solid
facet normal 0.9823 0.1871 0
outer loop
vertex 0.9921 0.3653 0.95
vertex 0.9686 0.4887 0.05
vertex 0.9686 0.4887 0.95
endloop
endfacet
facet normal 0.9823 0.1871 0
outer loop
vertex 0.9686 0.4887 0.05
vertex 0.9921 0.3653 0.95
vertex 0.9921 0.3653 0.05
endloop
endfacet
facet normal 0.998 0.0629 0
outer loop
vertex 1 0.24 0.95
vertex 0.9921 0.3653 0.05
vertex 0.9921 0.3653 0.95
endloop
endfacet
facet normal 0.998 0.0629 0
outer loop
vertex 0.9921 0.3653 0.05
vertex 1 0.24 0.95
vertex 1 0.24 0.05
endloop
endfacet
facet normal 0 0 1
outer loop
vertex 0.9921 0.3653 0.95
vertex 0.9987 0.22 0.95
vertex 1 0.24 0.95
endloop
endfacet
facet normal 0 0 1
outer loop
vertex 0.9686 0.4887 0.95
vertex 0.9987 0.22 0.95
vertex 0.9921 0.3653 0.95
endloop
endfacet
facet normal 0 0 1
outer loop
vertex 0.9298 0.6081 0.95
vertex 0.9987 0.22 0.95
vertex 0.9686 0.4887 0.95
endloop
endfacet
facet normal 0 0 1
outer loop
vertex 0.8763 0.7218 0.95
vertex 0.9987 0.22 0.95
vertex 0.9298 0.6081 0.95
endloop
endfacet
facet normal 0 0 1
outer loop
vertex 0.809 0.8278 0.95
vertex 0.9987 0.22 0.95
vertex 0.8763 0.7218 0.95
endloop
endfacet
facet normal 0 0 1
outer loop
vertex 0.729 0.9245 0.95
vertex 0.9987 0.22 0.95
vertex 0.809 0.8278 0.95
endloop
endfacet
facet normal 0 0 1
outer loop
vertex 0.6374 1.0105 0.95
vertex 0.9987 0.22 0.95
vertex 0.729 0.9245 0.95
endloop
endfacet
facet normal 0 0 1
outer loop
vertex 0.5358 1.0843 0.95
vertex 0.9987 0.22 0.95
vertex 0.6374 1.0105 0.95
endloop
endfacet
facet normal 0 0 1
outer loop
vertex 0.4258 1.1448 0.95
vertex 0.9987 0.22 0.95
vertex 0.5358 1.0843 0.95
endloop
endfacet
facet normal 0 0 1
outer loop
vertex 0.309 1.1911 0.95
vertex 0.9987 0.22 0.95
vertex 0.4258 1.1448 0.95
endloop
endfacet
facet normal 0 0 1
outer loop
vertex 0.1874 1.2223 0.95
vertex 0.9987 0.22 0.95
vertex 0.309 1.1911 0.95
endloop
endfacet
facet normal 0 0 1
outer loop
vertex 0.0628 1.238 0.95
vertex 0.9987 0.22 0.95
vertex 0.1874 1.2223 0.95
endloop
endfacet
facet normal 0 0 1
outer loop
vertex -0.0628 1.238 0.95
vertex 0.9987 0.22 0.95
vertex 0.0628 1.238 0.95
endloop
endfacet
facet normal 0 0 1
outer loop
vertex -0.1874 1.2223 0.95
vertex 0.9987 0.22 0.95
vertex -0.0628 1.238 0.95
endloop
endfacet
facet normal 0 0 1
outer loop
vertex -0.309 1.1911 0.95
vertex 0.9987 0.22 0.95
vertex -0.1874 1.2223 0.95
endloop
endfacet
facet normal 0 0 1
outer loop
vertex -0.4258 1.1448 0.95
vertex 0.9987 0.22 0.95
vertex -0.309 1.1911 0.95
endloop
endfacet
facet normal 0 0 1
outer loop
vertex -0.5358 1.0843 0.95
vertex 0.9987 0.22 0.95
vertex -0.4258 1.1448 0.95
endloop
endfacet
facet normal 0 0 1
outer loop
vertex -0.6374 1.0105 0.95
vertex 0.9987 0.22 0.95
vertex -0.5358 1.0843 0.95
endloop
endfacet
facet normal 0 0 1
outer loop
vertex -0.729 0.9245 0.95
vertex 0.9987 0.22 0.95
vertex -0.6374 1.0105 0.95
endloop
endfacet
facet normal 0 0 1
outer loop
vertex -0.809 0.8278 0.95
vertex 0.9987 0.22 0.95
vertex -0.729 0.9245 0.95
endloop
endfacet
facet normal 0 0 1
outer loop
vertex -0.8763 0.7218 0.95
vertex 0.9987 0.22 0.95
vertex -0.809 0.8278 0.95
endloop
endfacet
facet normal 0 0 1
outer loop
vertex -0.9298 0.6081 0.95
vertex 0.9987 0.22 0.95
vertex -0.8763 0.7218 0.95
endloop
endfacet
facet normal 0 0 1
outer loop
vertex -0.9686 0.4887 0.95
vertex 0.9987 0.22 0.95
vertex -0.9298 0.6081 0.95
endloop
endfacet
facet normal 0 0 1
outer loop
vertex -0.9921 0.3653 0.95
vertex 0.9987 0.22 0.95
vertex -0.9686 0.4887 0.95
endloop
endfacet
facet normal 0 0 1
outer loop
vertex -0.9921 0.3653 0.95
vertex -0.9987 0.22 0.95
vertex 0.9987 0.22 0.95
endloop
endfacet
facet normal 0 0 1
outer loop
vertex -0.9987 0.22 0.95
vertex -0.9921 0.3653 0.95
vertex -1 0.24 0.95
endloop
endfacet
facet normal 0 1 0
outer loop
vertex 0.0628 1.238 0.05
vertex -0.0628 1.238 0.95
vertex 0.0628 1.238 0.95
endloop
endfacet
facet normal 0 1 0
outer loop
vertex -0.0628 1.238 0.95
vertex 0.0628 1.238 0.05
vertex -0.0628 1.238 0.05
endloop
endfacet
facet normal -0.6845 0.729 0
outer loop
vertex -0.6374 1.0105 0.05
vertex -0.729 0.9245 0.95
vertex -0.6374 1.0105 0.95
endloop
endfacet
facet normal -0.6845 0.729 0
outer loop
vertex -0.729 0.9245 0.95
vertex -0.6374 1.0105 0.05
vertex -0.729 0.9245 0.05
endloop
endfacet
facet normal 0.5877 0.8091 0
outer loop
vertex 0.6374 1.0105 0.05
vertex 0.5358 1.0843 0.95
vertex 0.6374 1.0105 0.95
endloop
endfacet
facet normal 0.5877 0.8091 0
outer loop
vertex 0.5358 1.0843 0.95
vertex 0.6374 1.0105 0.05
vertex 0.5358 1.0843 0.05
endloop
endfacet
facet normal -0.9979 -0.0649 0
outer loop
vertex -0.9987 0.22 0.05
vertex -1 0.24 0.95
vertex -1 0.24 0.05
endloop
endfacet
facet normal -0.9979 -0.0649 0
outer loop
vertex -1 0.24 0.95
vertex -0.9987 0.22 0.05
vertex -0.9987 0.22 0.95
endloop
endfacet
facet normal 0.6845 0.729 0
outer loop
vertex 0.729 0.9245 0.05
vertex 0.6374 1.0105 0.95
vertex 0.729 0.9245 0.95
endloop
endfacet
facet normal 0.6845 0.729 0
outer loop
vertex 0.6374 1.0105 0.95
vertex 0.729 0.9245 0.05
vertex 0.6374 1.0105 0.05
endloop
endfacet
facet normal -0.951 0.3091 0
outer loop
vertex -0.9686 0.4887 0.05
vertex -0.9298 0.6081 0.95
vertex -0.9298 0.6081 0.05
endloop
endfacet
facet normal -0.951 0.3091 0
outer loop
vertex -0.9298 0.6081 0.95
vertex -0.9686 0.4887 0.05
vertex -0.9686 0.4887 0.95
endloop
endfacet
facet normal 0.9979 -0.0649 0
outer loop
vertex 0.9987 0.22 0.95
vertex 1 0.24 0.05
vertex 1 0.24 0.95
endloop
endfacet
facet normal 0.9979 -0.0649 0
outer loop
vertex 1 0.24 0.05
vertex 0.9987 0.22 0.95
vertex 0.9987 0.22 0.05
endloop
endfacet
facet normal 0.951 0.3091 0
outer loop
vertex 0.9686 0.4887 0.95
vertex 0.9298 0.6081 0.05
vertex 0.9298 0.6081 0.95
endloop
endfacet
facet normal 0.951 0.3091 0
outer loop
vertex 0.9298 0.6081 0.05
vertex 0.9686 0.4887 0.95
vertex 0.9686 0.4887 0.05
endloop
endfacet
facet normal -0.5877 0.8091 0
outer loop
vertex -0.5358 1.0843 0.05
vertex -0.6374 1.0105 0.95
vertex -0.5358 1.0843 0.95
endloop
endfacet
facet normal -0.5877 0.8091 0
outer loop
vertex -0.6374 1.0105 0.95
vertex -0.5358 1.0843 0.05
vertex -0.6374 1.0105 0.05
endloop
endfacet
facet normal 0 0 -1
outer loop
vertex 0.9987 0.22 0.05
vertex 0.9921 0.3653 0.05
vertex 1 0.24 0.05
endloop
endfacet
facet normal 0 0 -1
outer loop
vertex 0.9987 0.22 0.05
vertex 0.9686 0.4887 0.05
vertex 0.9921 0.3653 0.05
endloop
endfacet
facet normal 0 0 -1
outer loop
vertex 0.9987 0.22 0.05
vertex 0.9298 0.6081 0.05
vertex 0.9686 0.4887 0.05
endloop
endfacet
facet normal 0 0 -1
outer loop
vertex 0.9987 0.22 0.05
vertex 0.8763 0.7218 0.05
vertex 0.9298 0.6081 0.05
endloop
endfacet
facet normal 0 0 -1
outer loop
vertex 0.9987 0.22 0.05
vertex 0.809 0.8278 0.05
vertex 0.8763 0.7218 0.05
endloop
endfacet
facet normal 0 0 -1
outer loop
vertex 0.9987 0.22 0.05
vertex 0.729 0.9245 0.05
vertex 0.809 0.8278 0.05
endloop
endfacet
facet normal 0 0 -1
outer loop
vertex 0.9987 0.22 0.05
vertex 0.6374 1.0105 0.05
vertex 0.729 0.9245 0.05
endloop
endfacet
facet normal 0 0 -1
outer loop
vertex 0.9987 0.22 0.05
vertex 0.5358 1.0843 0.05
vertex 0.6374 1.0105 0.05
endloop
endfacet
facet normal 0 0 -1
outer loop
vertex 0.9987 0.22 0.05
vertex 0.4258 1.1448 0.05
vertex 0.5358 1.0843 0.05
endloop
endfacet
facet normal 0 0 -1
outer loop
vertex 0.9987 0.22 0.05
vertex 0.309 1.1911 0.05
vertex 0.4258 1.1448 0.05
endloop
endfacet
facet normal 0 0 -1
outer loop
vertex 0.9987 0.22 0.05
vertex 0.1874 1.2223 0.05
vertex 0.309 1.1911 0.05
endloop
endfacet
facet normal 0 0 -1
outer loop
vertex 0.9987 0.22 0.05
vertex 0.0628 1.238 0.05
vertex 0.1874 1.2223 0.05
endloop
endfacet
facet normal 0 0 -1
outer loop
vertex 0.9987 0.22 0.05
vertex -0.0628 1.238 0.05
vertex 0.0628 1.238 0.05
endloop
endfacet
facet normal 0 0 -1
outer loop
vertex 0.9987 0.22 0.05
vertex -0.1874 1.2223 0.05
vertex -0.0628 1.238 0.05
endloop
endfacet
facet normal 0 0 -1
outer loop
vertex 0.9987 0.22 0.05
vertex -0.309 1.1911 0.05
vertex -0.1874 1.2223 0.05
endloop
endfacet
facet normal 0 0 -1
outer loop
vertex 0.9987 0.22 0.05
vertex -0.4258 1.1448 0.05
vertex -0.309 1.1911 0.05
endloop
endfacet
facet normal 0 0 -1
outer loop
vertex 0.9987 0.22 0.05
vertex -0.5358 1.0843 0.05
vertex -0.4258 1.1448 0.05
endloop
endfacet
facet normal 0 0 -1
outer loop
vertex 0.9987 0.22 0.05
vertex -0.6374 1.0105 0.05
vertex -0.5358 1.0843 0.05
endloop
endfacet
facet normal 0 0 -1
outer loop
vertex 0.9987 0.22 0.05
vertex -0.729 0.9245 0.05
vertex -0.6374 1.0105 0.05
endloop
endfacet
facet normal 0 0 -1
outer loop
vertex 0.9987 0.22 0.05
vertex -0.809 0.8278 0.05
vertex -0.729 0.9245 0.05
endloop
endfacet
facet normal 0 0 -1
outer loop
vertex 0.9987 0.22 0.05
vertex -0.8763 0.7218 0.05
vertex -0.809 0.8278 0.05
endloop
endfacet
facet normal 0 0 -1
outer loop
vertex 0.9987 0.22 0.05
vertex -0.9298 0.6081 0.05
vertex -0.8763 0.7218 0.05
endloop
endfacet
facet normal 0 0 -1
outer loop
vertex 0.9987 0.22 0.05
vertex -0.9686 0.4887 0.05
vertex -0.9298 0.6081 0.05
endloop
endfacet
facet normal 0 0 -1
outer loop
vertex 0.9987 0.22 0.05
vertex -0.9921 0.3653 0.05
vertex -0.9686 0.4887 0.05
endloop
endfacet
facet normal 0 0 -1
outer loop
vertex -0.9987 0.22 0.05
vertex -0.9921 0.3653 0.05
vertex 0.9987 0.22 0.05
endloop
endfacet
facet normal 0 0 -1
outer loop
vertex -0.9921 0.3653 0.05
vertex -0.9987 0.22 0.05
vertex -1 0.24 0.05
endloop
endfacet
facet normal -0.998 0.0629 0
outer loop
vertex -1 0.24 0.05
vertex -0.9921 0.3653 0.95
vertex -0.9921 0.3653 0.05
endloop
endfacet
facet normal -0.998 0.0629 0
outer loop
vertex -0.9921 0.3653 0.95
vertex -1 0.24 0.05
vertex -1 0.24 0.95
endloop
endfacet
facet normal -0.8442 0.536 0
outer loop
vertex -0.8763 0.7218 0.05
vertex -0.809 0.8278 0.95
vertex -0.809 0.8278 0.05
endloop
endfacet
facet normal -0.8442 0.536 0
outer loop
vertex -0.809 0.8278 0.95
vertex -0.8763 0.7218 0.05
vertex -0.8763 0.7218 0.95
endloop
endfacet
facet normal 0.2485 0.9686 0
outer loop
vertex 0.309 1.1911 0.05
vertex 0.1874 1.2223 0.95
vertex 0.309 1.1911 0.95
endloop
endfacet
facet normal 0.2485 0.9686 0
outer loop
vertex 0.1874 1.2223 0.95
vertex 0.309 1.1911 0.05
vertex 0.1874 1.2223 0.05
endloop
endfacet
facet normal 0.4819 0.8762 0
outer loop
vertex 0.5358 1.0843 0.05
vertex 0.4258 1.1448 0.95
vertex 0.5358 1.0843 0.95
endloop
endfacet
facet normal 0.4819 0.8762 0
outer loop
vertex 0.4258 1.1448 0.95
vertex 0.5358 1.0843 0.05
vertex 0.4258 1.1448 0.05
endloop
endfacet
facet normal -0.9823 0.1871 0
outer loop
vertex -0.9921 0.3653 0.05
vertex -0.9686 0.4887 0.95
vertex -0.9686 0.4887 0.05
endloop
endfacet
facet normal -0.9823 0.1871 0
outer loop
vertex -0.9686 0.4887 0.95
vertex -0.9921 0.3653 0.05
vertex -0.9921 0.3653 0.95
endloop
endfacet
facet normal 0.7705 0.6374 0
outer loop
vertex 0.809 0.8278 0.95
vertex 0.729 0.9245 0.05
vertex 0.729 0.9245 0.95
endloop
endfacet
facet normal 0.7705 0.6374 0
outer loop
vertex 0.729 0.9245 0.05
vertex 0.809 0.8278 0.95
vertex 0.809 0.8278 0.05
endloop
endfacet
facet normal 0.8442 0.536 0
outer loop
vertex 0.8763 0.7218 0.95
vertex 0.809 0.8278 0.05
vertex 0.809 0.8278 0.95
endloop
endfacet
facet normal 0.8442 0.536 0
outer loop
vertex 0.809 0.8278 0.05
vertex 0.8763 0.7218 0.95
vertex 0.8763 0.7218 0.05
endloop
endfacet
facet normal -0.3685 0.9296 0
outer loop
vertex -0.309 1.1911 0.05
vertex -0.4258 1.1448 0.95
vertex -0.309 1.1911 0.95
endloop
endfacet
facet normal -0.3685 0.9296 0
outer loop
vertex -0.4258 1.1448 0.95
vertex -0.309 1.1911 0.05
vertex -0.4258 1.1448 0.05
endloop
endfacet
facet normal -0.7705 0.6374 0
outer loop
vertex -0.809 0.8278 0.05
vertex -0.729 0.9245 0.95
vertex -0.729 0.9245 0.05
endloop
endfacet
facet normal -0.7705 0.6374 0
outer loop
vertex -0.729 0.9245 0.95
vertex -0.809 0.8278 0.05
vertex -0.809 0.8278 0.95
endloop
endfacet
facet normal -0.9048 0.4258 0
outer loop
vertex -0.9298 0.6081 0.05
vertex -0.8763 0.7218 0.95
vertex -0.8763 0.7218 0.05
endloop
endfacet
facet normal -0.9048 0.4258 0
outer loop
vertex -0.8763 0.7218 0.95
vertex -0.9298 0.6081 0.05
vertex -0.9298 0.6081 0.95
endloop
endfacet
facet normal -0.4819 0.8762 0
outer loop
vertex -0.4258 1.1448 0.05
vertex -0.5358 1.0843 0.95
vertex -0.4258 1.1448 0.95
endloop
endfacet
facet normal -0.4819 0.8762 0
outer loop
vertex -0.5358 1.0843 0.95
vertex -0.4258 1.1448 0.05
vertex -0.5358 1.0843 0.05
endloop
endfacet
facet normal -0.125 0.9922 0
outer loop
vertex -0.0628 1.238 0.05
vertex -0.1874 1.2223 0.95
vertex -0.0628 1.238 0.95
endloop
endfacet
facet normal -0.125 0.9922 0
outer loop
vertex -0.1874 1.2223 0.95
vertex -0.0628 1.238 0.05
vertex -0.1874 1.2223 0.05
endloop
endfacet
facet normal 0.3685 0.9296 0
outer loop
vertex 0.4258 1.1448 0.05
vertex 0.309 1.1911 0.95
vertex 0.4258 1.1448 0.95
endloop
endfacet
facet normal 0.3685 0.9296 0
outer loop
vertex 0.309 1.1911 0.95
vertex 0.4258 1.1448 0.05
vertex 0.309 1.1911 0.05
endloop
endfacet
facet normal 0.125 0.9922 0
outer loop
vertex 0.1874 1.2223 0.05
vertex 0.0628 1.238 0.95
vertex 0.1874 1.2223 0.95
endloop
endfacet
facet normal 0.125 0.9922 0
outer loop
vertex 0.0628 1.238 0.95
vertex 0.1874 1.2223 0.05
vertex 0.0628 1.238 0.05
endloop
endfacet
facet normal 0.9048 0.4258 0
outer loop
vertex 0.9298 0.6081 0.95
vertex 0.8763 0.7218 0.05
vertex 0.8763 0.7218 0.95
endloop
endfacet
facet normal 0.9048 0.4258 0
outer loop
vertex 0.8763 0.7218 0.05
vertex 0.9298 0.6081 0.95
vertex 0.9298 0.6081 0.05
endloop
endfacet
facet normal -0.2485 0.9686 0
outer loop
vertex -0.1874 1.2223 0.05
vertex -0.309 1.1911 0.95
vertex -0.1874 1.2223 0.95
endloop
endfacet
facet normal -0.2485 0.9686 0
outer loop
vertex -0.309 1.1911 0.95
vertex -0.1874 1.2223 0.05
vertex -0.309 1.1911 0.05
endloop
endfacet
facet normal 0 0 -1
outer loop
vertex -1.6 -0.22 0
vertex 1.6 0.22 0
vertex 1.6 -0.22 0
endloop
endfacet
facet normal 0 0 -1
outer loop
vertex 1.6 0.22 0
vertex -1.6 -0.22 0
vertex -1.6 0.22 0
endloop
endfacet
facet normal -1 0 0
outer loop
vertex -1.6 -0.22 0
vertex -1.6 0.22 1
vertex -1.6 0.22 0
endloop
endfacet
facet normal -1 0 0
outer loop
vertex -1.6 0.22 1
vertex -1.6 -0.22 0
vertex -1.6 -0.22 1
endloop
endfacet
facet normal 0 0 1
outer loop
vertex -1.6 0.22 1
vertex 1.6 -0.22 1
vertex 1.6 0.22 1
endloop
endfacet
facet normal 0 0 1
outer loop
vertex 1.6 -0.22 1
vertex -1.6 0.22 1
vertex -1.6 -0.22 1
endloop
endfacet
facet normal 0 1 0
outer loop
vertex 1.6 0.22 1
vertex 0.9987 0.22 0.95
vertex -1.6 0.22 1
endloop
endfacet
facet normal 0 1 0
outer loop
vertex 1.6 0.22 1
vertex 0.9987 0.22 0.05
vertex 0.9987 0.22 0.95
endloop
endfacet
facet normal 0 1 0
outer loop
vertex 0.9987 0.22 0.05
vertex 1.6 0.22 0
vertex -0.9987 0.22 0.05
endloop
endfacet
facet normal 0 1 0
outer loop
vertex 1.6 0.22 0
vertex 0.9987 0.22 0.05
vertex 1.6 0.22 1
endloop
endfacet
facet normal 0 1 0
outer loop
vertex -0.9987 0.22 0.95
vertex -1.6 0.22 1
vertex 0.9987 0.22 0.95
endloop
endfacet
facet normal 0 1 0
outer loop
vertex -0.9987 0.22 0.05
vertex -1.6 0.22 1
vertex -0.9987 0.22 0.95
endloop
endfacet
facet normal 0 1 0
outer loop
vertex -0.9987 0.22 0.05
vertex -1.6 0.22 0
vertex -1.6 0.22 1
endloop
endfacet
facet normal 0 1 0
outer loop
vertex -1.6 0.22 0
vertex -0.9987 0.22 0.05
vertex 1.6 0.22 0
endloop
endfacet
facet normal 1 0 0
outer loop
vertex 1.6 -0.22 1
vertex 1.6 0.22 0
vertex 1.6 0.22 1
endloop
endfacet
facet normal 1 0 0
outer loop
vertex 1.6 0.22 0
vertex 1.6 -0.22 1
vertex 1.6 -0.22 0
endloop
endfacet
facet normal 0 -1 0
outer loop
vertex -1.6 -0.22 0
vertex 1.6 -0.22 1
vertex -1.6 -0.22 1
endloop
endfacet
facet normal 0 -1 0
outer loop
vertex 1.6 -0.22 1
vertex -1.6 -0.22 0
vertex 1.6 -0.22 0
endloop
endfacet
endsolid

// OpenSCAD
echo(version=version());
in2mm = 25.4;
mm2in = 1/in2mm;

body_w = 3.20;
body_l = 0.44;
body_h = 1.00;

stud_w = (2.9 - 1) / 2;
stud_l = (body_w - 2.7) / 2;
stud_h = .1;
stud_x = stud_w / 2 + 0.2;
stud_y = (body_w - stud_l) / 2;


bcut_w = 3.60;
bcut_h = 2.20;

lens_d = 2.00;
lens_h = 1.00;
lens_x = 0.00;
lens_y = 0.24;


$fn = 50;

color("white")
{
    // Body
    linear_extrude(height = body_h) square([body_w, body_l], true);
   
}
color("blue")
{
    difference() {
        translate([lens_x, lens_y, 0.05]) 
            linear_extrude(height = lens_h-0.1) circle(d=lens_d);

        translate([lens_x, -body_l, -0.1]) 
        linear_extrude(height = lens_h+0.2) square([body_w, body_l*2], true);
    }
}


// Written in 2015 by Torsten Paul <Torsten.Paul@gmx.de>
